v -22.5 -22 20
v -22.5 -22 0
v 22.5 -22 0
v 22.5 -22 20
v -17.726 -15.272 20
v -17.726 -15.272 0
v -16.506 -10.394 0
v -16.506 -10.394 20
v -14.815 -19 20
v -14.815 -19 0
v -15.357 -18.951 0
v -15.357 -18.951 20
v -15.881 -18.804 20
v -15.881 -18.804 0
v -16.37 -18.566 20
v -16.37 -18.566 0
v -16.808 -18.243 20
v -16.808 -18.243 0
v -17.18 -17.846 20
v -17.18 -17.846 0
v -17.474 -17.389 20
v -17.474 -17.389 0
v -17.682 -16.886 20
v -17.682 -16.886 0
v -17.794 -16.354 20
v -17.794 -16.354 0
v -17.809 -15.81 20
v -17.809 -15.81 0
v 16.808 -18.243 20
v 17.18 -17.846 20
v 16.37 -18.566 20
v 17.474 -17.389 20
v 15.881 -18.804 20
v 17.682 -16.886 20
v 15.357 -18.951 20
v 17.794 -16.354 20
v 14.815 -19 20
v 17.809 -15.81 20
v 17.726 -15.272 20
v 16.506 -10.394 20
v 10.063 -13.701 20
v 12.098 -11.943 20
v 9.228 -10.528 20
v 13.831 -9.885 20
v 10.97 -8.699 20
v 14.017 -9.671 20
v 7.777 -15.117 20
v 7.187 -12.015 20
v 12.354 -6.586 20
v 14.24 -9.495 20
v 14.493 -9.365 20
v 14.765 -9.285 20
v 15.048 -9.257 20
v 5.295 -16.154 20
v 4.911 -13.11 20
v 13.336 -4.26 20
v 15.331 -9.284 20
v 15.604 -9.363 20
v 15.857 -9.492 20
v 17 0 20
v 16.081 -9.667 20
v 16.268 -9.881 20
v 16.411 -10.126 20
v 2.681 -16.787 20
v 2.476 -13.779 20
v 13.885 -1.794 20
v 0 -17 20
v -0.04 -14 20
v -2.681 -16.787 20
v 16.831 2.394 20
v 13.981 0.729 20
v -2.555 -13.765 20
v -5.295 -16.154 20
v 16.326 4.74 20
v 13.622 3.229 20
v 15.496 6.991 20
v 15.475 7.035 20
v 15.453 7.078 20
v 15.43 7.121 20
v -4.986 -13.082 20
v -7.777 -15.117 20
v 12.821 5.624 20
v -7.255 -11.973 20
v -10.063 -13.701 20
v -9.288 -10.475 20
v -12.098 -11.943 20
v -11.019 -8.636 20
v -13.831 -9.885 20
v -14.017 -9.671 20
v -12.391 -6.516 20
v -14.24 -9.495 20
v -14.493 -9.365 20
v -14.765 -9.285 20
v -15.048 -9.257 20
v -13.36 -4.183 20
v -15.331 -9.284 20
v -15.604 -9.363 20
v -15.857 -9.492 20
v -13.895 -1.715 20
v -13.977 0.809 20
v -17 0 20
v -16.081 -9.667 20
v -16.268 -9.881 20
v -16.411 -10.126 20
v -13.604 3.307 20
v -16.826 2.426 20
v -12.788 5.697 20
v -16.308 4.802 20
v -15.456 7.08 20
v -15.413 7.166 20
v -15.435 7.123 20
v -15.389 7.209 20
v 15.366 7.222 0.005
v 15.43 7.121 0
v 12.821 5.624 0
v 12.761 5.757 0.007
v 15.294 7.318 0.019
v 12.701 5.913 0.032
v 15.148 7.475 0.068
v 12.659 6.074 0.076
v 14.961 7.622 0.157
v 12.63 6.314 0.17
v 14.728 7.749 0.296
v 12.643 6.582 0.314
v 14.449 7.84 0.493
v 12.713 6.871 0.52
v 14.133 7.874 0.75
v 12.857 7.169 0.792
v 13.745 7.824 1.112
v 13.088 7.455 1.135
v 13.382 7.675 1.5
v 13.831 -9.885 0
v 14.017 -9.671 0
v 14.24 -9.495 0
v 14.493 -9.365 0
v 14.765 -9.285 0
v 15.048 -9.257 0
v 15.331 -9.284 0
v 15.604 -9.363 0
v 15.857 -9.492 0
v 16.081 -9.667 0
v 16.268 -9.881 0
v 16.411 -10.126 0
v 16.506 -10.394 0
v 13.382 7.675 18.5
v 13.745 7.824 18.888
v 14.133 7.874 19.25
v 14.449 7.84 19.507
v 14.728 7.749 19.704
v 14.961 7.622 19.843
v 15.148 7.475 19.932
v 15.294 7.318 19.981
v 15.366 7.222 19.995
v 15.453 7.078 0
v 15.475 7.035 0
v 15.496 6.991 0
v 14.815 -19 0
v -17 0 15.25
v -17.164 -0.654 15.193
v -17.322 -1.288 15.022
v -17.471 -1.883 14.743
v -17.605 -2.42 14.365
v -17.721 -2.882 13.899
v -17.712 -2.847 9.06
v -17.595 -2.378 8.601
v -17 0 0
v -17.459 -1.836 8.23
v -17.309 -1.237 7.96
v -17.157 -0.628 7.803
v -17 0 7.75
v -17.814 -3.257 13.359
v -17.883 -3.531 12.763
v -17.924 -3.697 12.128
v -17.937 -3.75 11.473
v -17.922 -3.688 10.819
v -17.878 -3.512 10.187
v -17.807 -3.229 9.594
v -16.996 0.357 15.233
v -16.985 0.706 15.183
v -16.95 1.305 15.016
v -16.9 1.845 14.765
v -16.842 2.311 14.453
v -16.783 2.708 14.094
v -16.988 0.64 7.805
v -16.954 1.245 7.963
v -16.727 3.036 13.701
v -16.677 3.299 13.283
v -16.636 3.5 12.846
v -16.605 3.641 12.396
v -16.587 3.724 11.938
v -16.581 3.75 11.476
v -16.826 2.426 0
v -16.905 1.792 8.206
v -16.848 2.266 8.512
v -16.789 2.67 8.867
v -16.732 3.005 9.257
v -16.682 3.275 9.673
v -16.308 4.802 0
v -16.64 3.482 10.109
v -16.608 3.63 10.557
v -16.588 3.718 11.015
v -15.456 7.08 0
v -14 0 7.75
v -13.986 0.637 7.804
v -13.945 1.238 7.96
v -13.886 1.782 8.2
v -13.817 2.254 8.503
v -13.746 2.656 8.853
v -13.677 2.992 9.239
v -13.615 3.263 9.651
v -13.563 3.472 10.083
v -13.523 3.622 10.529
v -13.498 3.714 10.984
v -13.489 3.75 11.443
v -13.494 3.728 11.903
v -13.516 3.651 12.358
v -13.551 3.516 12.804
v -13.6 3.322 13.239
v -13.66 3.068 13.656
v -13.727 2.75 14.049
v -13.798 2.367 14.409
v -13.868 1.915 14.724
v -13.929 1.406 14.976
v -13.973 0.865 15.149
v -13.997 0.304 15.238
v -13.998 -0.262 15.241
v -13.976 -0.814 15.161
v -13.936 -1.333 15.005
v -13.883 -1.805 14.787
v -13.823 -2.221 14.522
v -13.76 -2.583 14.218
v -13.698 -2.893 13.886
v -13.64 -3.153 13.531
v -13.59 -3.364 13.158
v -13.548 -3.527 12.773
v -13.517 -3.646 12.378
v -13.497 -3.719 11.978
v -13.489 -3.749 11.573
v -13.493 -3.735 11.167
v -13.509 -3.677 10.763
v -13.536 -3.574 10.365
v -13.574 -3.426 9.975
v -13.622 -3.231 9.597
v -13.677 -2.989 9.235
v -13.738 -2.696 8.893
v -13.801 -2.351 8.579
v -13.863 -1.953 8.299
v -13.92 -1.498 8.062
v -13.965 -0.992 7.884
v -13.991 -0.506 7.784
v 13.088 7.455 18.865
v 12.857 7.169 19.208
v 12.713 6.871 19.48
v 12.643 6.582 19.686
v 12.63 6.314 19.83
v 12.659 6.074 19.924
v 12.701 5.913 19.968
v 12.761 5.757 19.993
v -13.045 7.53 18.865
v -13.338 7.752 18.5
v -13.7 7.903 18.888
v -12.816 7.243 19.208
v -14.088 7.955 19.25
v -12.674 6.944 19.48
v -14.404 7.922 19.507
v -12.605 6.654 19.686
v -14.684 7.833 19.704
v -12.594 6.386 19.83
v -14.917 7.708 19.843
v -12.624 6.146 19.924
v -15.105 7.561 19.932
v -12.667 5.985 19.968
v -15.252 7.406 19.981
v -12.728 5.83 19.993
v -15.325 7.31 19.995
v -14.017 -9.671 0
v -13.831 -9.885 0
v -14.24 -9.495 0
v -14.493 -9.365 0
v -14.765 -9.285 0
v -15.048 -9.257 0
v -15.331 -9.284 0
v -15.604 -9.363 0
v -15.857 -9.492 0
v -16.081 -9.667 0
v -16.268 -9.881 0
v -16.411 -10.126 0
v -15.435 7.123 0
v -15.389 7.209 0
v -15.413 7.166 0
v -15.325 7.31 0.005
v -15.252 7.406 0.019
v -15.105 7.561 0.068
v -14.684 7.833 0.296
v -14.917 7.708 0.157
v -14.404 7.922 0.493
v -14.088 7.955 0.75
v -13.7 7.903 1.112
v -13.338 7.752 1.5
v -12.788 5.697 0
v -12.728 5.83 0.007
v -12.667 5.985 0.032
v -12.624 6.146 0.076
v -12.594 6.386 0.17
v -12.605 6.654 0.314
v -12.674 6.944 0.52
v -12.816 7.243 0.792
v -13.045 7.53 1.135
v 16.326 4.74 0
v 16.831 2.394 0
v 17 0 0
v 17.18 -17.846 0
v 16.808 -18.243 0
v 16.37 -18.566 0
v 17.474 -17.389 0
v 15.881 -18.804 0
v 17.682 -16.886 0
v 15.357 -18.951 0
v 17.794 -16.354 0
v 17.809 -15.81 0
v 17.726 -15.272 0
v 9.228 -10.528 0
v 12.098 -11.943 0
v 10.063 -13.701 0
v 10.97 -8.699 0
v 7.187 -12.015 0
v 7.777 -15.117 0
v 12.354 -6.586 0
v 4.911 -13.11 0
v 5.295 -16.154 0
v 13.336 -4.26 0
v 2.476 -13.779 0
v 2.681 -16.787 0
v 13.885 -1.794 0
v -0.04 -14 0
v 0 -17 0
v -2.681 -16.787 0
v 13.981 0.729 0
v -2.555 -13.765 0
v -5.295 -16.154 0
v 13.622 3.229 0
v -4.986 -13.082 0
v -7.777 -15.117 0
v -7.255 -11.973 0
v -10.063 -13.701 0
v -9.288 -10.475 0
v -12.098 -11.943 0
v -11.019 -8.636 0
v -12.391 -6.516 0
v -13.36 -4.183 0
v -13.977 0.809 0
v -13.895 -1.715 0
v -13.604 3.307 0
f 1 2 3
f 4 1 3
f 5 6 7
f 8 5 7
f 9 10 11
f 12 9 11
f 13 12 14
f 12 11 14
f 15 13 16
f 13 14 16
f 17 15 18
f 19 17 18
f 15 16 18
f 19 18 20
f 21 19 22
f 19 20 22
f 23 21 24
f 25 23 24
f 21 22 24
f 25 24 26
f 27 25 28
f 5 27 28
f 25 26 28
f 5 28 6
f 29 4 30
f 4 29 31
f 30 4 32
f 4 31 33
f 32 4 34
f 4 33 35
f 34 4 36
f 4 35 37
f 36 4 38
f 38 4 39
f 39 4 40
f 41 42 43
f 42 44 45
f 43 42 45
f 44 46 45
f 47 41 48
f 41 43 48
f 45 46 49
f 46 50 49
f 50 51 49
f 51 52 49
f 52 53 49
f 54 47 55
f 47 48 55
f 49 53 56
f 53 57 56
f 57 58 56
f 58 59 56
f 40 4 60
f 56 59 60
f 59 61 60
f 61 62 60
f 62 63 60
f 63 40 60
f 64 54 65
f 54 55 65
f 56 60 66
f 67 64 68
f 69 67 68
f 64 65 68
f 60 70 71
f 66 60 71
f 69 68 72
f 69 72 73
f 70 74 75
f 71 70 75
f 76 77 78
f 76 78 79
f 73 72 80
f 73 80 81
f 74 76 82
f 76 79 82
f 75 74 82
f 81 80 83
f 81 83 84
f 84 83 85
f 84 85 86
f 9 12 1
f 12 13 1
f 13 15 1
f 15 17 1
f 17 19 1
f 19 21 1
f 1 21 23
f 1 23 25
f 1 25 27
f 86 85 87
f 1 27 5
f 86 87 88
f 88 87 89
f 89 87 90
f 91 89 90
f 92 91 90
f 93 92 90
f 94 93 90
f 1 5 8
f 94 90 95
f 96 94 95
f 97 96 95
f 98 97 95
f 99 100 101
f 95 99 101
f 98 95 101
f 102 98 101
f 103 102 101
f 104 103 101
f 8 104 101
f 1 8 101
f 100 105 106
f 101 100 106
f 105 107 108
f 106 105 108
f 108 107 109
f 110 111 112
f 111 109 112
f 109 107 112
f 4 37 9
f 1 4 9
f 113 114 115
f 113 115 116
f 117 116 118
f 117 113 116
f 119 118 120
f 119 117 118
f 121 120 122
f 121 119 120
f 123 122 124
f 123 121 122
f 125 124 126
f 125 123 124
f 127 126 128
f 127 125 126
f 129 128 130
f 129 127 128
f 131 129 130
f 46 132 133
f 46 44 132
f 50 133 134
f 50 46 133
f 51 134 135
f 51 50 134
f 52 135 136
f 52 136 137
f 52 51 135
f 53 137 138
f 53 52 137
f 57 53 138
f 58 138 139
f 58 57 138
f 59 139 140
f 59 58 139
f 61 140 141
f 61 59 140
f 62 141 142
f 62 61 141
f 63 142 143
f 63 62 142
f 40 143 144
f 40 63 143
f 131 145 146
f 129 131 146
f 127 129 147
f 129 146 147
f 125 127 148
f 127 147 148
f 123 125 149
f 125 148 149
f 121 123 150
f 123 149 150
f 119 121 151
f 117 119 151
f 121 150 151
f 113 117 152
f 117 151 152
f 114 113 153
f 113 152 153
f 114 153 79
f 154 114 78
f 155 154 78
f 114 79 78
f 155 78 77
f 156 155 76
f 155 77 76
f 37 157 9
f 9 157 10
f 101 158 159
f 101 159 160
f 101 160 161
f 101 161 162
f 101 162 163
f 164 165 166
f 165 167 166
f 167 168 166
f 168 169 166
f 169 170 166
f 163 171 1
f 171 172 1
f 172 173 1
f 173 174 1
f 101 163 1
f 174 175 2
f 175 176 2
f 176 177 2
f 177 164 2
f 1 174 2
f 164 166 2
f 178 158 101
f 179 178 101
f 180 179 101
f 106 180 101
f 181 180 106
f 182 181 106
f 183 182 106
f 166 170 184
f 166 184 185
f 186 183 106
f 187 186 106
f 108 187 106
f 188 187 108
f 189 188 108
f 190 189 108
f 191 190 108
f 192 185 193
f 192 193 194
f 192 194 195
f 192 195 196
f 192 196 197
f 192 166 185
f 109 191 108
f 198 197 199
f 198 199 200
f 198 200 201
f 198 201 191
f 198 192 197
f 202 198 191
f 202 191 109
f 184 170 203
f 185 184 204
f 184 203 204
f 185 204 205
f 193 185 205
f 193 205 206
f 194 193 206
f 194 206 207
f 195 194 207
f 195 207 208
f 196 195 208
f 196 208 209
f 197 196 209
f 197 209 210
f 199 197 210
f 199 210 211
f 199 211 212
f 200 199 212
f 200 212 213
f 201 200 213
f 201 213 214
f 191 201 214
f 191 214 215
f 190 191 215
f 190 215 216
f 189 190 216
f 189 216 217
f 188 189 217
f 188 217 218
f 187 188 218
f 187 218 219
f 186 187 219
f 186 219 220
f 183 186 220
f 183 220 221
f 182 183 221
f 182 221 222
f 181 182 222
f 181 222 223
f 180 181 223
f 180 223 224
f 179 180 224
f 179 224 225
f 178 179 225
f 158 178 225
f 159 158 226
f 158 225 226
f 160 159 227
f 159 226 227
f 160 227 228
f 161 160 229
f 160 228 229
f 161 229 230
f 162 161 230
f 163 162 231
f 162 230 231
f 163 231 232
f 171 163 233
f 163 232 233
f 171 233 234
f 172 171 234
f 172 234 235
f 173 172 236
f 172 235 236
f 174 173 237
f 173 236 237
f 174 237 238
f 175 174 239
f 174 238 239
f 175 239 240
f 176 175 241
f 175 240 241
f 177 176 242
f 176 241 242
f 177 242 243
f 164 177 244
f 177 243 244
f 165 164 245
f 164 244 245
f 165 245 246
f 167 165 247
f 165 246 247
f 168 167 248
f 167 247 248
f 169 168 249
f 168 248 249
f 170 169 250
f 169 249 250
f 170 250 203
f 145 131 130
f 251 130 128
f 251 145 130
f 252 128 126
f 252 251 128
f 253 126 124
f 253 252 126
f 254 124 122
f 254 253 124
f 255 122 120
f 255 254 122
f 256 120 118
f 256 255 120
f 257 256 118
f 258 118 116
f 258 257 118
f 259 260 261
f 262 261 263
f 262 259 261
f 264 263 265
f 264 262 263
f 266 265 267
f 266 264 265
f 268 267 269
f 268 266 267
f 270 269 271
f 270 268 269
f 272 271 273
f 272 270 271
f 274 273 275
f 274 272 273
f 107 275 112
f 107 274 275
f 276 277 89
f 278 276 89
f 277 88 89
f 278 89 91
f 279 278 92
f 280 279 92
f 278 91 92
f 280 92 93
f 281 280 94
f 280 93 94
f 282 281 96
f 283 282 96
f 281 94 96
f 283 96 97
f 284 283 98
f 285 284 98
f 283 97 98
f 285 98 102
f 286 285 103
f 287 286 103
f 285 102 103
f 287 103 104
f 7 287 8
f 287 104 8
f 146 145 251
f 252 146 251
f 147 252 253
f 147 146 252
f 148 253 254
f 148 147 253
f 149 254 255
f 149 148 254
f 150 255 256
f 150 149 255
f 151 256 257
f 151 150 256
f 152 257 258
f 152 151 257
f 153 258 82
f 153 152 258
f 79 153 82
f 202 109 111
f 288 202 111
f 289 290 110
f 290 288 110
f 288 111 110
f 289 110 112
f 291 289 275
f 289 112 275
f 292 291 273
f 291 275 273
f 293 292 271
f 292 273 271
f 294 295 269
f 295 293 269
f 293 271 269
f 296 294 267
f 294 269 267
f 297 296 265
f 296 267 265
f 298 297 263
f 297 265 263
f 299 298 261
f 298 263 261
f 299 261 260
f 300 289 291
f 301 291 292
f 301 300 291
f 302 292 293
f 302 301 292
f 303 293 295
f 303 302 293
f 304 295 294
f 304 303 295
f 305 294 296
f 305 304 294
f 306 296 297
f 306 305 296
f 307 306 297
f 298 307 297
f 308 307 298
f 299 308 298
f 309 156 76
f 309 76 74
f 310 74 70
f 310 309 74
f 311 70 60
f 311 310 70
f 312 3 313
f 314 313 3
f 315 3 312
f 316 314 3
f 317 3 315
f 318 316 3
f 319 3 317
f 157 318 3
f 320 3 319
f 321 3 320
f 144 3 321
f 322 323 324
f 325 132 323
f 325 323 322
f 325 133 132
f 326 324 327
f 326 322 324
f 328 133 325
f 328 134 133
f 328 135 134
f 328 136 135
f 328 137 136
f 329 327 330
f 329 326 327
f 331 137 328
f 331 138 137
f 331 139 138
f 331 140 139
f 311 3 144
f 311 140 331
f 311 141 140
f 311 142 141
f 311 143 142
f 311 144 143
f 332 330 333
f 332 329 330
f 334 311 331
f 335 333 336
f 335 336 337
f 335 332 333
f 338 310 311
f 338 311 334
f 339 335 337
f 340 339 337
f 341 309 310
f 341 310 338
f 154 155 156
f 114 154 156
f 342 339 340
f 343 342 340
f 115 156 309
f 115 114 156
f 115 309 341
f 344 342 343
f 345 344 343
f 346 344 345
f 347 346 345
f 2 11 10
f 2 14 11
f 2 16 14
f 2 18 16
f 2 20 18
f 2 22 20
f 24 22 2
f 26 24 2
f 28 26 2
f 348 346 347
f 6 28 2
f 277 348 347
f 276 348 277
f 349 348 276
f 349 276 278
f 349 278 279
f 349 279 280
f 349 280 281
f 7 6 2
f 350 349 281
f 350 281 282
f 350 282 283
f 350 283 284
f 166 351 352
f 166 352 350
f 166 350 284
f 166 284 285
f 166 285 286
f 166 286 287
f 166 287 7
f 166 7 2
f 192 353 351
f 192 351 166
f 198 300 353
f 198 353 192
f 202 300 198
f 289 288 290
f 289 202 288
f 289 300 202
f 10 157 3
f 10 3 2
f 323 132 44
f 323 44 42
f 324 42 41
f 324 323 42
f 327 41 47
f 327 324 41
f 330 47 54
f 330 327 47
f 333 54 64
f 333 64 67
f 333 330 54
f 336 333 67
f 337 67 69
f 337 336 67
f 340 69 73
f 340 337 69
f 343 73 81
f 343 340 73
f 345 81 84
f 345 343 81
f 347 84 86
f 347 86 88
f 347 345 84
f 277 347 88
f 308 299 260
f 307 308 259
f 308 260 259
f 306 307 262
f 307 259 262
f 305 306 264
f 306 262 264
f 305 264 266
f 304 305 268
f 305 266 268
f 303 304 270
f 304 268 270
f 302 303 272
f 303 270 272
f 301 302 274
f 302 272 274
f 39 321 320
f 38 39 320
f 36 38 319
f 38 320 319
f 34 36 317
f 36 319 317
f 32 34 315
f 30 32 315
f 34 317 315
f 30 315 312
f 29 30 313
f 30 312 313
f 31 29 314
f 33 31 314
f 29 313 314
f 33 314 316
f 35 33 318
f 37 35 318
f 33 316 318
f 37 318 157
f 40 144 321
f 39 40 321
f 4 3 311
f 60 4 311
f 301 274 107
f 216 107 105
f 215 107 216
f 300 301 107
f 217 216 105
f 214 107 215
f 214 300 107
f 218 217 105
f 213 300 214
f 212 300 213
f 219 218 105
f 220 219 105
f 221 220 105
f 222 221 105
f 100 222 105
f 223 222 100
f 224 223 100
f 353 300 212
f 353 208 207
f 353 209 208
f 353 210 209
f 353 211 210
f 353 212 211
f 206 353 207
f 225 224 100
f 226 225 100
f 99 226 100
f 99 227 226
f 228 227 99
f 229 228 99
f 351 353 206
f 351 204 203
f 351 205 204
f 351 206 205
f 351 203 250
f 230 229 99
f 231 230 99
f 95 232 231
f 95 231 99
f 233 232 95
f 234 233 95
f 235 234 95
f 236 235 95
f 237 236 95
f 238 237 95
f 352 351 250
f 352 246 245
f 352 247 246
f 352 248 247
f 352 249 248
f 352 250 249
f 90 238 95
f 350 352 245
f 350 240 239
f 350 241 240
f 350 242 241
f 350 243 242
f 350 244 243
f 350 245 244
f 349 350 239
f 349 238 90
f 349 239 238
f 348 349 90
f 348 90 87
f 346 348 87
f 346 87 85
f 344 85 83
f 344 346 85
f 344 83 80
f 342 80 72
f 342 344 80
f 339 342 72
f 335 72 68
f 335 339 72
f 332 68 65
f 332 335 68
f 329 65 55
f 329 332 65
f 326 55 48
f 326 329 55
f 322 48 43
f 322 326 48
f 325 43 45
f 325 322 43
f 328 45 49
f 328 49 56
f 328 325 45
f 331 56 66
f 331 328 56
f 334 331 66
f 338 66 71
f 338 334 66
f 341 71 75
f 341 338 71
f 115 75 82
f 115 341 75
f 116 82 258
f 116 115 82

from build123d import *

# Parameters (mm, degrees)
BOSS_EXTRUDE1_DEPTH = 20
BOSS_EXTRUDE2_START = -20
BOSS_EXTRUDE2_DEPTH = 20
FILLET1_R           = 1.5
FILLET2_R           = 1.5
SKETCH3_R           = 3.75
CUT_EXTRUDE1_DEPTH  = 20


with BuildPart() as part:
    # Sketch1 → Boss-Extrude1 (new body)
    with BuildSketch(Plane.XY):
        with BuildLine():
            Line((12.14432037, 6.965305646), (14.746674735, 8.457871142))
            ThreePointArc((14.746674735, 8.457871142), (-0.048606097, -16.999930513), (-14.698068638, 8.542059371))
            Line((-14.698068638, 8.542059371), (-12.10429182, 7.034637129))
            ThreePointArc((-12.10429182, 7.034637129), (-0.04002855, -13.999942775), (12.14432037, 6.965305646))
        make_face()
    extrude(amount=BOSS_EXTRUDE1_DEPTH)

    # Sketch2 → Boss-Extrude2 (add)
    with BuildSketch(Plane.XY.offset(20).offset(BOSS_EXTRUDE2_START)):
        with BuildLine():
            Line((-17, 0), (-22.5, -22))
            Line((-22.5, -22), (22.5, -22))
            Line((22.5, -22), (17, 0))
            ThreePointArc((17, 0), (16.645771335, -3.452288612), (15.597847452, -6.760706684))
            Line((15.597847452, -6.760706684), (17.725769062, -15.272393125))
            ThreePointArc((17.725769062, -15.272393125), (17.179957876, -17.846236628), (14.815341562, -19))
            Line((14.815341562, -19), (-14.815341562, -19))
            ThreePointArc((-14.815341562, -19), (-17.179957876, -17.846236628), (-17.725769062, -15.272393125))
            Line((-17.725769062, -15.272393125), (-15.597847452, -6.760706684))
            ThreePointArc((-15.597847452, -6.760706684), (-16.645771335, -3.452288612), (-17, 0))
        make_face()
    extrude(amount=BOSS_EXTRUDE2_DEPTH)

    # Fillet1
    fillet1_edges = [part.edges().sort_by_distance(p)[0] for p in [
        (-15.597847452, -6.760706684, 10),
        (15.597847452, -6.760706684, 10),
    ]]
    fillet(fillet1_edges, radius=FILLET1_R)

    # Fillet2
    fillet2_edges = [part.edges().sort_by_distance(p)[0] for p in [
        (13.445497553, 7.711588394, 20),
        (13.445497553, 7.711588394, 0),
        (-13.401180229, 7.78834825, 0),
        (12.14432037, 6.965305646, 10),
        (14.746674735, 8.457871142, 10),
        (-14.698068638, 8.542059371, 10),
        (-12.10429182, 7.034637129, 10),
        (-13.401180229, 7.78834825, 20),
    ]]
    fillet(fillet2_edges, radius=FILLET2_R - 0.0001)  # a hair under: the kernel refuses the full size

    # Sketch3 → Cut-Extrude1 (cut)
    with BuildSketch(Plane(origin=(0, 0, 0), x_dir=(0, 0, -1), z_dir=(1, 0, 0))):
        with Locations((-11.5, 0)):
            Circle(SKETCH3_R)
    extrude(amount=-CUT_EXTRUDE1_DEPTH, mode=Mode.SUBTRACT)


solid = part.part
